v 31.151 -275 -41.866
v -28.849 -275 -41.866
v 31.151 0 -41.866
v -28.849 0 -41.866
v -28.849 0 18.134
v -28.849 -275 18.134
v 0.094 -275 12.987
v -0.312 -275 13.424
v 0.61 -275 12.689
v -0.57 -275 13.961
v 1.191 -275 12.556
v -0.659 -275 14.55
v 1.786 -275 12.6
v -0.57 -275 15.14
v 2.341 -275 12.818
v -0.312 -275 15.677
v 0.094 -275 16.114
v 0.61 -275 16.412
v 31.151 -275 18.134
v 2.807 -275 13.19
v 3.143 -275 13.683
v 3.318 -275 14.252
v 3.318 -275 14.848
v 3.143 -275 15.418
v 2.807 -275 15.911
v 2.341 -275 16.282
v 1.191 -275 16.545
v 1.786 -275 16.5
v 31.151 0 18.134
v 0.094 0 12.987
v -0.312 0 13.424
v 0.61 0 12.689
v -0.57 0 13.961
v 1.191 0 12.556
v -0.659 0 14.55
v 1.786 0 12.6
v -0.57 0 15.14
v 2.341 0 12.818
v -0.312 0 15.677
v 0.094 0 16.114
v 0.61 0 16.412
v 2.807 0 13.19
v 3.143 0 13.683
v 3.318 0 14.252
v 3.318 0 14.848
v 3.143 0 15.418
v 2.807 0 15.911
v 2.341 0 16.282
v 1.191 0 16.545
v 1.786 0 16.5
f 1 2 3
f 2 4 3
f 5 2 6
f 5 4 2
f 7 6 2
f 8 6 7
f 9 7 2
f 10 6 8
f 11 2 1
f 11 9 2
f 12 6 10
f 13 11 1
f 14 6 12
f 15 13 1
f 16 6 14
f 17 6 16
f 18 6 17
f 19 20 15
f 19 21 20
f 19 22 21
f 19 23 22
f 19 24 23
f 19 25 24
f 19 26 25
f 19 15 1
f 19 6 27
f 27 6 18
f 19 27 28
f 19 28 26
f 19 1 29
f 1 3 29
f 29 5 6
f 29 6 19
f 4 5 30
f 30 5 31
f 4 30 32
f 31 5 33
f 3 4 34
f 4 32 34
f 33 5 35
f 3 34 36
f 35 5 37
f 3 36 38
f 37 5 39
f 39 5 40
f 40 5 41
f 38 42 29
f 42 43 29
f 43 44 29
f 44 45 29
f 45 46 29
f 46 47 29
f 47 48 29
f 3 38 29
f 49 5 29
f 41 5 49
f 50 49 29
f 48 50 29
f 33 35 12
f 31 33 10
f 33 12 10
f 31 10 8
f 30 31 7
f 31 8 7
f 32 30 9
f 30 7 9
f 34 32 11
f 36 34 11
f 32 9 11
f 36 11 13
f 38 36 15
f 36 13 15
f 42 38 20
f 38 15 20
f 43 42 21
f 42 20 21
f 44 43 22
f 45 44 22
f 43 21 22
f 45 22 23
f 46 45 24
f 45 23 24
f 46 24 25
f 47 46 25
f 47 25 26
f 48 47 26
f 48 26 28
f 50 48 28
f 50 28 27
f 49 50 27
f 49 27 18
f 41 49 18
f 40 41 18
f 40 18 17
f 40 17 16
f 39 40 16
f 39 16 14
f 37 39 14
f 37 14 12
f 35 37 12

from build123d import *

# Parameters (mm, degrees)
F0_W     = 60
F0_H     = 60
F1_DEPTH = 25
F2_DEPTH = 250
F4_D     = 4


with BuildPart() as f1:
    # F0 (on Front) → F1 (new body)
    with BuildSketch(Plane.XZ):
        with Locations((1.1512227356, -11.8655072413)):
            Rectangle(F0_W, F0_H)
    extrude(amount=F1_DEPTH)

    # F2 (add): a face of the model
    f2_faces = [f1.faces().sort_by_distance(p)[0] for p in [
        (1.1512227356, -25, -11.8655072413),
    ]]
    extrude(f2_faces, amount=F2_DEPTH)

    # F4 (through all)
    with Locations(Plane(origin=(0, 0, 0), x_dir=(1, 0, 0), z_dir=(0, 1, 0))):
        with Locations((1.3407834521, -14.5503044262)):
            Hole(F4_D / 2)


solid = f1.part
